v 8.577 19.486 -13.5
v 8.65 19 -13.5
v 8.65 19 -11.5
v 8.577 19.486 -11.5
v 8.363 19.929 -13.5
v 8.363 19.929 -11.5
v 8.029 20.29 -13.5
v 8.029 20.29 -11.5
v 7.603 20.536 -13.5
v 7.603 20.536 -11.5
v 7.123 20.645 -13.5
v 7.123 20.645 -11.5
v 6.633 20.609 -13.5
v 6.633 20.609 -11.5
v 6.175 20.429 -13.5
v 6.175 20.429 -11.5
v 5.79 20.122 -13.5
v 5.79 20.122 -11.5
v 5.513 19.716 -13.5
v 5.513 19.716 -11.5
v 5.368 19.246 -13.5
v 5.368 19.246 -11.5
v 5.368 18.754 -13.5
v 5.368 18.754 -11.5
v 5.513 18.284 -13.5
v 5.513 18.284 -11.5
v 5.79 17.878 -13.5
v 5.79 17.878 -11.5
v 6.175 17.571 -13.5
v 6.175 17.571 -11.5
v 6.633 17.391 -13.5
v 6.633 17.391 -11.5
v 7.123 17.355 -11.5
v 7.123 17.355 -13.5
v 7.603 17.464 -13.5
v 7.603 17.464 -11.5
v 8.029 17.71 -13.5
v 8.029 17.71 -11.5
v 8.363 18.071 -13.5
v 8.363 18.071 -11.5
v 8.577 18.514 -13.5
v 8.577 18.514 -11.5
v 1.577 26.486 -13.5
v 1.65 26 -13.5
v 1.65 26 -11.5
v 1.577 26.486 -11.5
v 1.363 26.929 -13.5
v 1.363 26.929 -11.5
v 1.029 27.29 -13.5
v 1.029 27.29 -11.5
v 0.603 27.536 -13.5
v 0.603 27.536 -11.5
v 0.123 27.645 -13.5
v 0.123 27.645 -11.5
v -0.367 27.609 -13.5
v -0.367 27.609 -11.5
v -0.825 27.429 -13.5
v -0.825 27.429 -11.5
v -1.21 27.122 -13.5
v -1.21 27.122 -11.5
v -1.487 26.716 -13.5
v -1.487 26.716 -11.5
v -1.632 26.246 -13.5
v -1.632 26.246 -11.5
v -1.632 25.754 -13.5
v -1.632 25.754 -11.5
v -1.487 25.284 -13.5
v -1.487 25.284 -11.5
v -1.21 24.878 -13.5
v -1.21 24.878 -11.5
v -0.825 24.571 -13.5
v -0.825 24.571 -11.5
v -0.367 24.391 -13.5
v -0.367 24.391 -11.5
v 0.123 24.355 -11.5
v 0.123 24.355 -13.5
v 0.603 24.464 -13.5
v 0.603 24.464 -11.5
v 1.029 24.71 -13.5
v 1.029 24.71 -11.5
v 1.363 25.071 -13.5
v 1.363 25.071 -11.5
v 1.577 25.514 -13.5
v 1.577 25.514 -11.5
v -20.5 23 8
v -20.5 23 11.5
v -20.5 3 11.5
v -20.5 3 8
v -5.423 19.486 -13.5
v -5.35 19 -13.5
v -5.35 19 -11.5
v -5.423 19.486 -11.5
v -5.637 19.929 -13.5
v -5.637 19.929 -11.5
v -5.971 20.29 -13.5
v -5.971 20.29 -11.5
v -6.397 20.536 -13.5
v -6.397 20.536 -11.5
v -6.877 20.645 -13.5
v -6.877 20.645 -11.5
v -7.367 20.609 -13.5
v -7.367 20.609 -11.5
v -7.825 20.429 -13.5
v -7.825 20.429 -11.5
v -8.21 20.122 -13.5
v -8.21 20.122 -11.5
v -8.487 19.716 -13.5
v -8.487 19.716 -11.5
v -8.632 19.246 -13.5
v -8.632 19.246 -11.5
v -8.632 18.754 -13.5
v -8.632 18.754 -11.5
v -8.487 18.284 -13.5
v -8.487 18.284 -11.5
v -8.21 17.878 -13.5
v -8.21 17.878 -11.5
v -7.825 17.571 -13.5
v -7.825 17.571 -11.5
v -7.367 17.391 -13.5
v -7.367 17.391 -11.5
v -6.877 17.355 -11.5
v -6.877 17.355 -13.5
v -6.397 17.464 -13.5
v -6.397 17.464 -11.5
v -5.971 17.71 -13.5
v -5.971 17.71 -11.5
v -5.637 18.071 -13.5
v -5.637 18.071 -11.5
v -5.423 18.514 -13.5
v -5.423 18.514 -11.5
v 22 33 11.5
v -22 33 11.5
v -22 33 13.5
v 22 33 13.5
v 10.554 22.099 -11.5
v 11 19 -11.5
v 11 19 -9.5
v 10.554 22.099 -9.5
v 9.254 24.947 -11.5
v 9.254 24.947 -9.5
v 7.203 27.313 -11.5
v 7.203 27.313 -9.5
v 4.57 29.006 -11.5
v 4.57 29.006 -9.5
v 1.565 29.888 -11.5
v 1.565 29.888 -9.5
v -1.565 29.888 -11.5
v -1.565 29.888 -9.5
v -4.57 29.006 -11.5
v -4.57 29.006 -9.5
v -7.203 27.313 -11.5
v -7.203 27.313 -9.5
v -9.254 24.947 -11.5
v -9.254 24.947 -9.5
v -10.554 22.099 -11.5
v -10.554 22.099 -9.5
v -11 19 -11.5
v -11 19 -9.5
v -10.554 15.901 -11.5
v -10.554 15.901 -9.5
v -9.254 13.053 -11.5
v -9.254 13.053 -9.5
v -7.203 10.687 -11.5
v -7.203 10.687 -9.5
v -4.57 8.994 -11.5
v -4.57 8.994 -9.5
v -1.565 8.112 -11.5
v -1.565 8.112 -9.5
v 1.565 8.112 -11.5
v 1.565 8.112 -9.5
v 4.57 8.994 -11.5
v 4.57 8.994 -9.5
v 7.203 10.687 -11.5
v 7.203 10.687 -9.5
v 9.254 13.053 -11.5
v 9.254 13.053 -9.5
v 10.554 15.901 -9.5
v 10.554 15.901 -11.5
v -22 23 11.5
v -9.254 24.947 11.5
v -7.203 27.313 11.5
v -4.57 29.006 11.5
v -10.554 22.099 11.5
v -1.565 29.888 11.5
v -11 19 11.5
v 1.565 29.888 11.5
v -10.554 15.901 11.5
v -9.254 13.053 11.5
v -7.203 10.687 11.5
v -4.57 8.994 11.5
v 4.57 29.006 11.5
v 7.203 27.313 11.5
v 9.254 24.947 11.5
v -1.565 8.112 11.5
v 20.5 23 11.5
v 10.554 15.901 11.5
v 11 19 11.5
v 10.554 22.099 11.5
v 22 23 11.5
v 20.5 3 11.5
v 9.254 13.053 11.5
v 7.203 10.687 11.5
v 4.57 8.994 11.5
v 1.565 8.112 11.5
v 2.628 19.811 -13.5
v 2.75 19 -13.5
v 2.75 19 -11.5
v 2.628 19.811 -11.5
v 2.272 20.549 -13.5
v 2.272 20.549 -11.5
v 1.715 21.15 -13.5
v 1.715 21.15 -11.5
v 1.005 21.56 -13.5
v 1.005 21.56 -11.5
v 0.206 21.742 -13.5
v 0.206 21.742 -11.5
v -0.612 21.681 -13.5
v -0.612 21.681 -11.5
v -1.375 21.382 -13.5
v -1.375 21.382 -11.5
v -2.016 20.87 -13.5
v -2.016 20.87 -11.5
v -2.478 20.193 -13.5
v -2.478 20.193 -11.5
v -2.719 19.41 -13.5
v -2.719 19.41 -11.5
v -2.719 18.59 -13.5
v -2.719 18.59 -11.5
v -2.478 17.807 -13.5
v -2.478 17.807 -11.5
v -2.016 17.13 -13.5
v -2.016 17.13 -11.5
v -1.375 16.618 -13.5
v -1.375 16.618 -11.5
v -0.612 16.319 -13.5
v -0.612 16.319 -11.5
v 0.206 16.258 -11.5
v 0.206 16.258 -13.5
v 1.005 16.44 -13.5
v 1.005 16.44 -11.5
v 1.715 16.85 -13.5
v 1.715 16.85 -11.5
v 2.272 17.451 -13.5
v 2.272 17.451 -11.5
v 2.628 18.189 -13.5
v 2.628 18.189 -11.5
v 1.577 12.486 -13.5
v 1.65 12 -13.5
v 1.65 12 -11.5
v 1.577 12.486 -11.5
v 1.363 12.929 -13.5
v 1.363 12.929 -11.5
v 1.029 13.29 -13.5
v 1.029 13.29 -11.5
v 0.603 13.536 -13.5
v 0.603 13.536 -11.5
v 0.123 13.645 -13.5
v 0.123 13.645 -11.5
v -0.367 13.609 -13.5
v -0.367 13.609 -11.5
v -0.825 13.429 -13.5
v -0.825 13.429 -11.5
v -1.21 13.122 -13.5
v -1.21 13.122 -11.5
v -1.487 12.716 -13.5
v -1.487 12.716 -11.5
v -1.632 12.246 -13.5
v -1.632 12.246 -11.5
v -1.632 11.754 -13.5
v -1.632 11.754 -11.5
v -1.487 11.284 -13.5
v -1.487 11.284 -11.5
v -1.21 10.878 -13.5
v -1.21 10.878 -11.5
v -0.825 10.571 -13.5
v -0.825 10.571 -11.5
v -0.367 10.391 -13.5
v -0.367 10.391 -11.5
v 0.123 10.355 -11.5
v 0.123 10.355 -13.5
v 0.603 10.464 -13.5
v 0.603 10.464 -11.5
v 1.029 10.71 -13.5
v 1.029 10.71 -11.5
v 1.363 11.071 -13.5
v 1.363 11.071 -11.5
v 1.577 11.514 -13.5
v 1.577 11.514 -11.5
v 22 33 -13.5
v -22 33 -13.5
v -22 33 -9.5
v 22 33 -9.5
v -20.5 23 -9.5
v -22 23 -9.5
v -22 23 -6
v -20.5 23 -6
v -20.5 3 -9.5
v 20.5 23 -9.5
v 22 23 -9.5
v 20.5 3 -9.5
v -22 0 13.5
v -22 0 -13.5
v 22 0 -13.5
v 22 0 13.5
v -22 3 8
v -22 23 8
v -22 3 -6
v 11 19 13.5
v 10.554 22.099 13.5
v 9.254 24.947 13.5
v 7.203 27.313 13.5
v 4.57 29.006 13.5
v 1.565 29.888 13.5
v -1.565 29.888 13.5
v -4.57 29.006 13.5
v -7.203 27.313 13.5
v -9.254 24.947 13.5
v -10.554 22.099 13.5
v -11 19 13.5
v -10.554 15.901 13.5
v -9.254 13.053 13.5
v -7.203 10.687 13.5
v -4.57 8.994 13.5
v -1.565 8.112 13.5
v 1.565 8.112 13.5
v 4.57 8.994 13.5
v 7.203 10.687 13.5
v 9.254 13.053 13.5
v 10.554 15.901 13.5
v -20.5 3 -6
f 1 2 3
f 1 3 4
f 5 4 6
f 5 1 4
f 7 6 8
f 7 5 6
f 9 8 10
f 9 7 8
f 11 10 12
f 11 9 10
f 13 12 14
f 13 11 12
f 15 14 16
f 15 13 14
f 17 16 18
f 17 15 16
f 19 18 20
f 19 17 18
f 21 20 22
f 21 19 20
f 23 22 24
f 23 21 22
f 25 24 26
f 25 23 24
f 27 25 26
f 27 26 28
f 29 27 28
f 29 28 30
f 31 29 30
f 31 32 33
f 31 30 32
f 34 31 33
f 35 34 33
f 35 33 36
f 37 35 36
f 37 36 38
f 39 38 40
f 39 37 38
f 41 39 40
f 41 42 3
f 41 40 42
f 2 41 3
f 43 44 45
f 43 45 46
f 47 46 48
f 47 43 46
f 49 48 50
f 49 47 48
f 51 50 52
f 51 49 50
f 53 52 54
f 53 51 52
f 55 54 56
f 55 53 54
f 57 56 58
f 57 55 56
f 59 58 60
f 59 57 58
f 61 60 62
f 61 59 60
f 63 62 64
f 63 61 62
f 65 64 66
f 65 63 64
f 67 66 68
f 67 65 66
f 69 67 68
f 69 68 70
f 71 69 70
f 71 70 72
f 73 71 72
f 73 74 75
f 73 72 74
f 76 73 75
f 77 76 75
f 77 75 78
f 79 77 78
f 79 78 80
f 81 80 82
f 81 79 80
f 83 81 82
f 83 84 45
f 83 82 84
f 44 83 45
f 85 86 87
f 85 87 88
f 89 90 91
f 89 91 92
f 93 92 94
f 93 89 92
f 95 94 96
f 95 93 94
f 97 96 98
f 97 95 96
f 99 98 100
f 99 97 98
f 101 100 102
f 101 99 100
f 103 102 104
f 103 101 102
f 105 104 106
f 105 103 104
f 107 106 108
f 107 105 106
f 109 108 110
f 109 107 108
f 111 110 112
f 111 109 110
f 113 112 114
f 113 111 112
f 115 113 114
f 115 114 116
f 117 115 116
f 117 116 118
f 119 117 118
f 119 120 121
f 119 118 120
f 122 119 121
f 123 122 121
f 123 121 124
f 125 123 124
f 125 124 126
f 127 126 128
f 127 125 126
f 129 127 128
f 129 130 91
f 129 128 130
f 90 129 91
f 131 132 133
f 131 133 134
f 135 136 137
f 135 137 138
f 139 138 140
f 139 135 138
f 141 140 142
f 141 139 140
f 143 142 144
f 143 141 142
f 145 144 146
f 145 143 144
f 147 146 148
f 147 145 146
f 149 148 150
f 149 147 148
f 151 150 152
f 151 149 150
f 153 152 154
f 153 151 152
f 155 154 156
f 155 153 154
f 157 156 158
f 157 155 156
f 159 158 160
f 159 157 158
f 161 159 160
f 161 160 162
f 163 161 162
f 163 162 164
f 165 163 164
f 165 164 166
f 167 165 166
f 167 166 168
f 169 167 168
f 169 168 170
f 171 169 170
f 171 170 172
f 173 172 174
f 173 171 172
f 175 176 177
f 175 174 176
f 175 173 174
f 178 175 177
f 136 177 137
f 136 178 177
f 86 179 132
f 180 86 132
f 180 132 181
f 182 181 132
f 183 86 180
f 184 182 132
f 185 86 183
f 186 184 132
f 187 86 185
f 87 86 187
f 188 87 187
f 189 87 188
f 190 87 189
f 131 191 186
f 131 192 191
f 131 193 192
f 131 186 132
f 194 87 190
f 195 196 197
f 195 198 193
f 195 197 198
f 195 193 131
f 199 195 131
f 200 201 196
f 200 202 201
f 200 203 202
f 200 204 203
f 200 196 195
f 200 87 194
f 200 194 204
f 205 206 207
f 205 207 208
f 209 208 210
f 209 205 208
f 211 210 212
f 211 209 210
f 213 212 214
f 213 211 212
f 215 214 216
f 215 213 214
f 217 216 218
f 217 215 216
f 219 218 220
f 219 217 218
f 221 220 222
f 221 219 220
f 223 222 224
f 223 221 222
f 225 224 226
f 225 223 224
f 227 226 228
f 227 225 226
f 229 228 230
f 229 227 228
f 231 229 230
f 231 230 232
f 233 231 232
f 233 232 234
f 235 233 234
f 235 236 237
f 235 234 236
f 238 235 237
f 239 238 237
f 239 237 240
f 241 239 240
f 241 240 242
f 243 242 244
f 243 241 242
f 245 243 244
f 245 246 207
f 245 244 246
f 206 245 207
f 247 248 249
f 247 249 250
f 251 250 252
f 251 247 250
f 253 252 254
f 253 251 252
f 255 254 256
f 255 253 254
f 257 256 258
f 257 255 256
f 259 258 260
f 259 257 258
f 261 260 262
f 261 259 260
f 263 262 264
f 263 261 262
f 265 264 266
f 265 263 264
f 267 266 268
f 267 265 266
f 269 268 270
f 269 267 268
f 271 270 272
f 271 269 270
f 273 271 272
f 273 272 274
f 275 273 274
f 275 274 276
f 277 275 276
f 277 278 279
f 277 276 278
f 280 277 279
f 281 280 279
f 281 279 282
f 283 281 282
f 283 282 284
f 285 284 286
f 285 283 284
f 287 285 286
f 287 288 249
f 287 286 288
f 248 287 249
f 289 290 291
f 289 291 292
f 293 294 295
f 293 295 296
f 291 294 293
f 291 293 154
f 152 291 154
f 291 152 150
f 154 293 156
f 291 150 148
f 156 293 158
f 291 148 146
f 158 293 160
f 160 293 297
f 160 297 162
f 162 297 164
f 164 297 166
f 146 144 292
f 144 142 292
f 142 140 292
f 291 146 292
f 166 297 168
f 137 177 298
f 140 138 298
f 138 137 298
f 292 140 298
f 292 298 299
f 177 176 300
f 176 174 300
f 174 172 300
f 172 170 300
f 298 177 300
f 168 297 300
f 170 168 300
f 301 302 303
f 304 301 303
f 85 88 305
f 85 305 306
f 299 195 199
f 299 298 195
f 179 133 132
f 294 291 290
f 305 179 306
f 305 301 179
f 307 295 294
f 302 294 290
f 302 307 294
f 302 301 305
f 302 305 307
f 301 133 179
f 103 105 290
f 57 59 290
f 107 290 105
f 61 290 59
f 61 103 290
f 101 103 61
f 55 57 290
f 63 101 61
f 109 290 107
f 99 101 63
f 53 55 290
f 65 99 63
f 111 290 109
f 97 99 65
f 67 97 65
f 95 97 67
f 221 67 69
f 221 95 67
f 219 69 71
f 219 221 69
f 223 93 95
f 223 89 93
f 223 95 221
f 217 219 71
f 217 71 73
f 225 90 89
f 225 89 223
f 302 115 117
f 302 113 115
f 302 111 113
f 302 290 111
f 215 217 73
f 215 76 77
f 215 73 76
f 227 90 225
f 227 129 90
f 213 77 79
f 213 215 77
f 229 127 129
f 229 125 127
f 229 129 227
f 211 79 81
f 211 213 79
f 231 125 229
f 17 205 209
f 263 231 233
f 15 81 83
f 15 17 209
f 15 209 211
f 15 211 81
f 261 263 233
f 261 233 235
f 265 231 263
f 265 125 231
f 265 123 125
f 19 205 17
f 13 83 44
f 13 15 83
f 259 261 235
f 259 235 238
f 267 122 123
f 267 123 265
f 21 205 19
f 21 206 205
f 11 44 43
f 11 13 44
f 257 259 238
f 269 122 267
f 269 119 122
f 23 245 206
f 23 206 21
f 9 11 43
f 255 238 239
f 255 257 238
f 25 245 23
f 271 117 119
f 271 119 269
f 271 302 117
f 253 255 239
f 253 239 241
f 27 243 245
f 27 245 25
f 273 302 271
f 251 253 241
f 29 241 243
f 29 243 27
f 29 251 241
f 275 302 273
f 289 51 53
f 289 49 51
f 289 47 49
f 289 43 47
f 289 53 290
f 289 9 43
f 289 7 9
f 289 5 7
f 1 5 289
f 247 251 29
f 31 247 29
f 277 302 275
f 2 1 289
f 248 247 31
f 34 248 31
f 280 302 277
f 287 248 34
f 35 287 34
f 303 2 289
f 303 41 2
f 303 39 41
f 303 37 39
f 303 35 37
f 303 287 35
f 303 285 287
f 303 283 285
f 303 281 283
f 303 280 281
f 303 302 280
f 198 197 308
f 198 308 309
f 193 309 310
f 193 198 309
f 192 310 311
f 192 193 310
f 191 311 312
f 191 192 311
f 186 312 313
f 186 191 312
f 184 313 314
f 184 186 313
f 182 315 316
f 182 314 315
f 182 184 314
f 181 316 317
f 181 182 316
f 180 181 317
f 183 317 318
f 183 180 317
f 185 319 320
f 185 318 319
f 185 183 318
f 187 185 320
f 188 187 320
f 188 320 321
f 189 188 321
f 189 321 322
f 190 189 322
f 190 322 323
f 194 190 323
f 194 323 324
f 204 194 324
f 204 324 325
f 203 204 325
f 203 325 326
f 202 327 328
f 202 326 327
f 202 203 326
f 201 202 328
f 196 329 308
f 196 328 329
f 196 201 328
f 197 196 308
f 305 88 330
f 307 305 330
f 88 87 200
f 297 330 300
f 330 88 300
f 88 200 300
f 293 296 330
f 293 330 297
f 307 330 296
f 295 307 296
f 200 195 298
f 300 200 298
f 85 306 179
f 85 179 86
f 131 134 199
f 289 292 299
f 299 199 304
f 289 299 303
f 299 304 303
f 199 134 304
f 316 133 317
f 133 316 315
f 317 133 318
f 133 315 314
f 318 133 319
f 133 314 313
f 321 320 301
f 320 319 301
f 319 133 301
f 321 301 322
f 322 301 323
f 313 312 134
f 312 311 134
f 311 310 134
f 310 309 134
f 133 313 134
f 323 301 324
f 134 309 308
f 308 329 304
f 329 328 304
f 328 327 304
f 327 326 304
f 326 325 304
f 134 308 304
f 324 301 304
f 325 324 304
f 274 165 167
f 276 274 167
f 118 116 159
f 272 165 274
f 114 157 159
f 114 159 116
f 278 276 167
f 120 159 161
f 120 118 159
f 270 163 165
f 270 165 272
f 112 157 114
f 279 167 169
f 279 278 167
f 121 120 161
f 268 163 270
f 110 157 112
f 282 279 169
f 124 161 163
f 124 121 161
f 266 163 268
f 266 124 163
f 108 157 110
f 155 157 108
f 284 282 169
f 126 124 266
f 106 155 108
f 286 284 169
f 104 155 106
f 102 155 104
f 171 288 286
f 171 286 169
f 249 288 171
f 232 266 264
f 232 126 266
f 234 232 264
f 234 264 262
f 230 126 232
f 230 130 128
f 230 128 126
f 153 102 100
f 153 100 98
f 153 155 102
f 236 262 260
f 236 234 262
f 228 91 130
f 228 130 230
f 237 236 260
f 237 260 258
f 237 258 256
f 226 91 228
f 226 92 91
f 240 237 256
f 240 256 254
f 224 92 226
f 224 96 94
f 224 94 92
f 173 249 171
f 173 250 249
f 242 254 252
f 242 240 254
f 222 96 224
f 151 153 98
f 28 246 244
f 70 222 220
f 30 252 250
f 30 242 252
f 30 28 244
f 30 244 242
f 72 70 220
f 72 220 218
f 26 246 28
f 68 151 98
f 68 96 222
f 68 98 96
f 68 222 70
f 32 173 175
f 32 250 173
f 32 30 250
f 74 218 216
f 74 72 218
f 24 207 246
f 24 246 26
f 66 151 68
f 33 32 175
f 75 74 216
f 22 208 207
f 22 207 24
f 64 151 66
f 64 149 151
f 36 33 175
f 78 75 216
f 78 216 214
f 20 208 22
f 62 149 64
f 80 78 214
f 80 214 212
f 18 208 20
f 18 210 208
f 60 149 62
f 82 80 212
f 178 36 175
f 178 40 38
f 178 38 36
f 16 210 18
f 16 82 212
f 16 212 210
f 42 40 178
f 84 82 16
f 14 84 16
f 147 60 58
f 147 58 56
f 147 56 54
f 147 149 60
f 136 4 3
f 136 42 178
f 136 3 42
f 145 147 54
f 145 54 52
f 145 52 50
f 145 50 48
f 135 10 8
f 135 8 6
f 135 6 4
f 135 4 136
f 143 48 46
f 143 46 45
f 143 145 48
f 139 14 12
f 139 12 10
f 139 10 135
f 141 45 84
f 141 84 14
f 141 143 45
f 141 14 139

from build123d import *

# Parameters (mm, degrees)
SKETCH1_W               = 44
SKETCH1_H               = 27
BOSS_EXTRUDE1_DEPTH     = 23
CUT_EXTRUDE2_START      = 23
SKETCH2_W               = 41
SKETCH2_H               = 21
CUT_EXTRUDE2_DEPTH      = 20
CUT_EXTRUDE3_START      = -20.5
SKETCH3_W               = 14
SKETCH3_H               = 20
CUT_EXTRUDE3_DEPTH      = 20
BOSS_EXTRUDE2_START     = 23
SKETCH4_W               = 44
SKETCH4_H               = 4
SKETCH4_H_2             = 2
BOSS_EXTRUDE2_DEPTH     = 10
CUT_EXTRUDE4_DEPTH      = 42.895703837
CUT_EXTRUDE4_DEPTH_BACK = 2
CUT_EXTRUDE4_START      = -9.5
SKETCH5_R               = 11
CUT_EXTRUDE5_DEPTH      = 42.895703837
CUT_EXTRUDE5_DEPTH_BACK = 42.895703837
SKETCH6_R               = 1.65
SKETCH6_R_2             = 2.75


with BuildPart() as part:
    # Sketch1 → Boss-Extrude1 (new body)
    with BuildSketch(Plane(origin=(0, 0, 0), x_dir=(1, 0, 0), z_dir=(0, 1, 0))):
        Rectangle(SKETCH1_W, SKETCH1_H)
    extrude(amount=BOSS_EXTRUDE1_DEPTH)

    # Sketch2 → Cut-Extrude2 (cut)
    with BuildSketch(Plane(origin=(0, 0, 0), x_dir=(1, 0, 0), z_dir=(0, 1, 0)).offset(CUT_EXTRUDE2_START)):
        with Locations((0, -1)):
            Rectangle(SKETCH2_W, SKETCH2_H)
    extrude(amount=-CUT_EXTRUDE2_DEPTH, mode=Mode.SUBTRACT)

    # Sketch3 → Cut-Extrude3 (cut)
    with BuildSketch(Plane(origin=(0, 0, 0), x_dir=(0, 0, -1), z_dir=(1, 0, 0)).offset(CUT_EXTRUDE3_START)):
        with Locations((-1, 13)):
            Rectangle(SKETCH3_W, SKETCH3_H)
    extrude(amount=-CUT_EXTRUDE3_DEPTH, mode=Mode.SUBTRACT)

    # Sketch4 → Boss-Extrude2 (add)
    with BuildSketch(Plane(origin=(0, 0, 0), x_dir=(1, 0, 0), z_dir=(0, 1, 0)).offset(BOSS_EXTRUDE2_START)):
        with Locations((0, 11.5)):
            Rectangle(SKETCH4_W, SKETCH4_H)
        with Locations((0, -12.5)):
            Rectangle(SKETCH4_W, SKETCH4_H_2)
    extrude(amount=BOSS_EXTRUDE2_DEPTH)

    # Sketch5 → Cut-Extrude4 (cut, two sides: drawn at the far end of the back side and taken through both)
    with BuildSketch(Plane.XY.offset(CUT_EXTRUDE4_START - CUT_EXTRUDE4_DEPTH_BACK)):
        with Locations((0, 19)):
            Circle(SKETCH5_R)
    extrude(amount=CUT_EXTRUDE4_DEPTH + CUT_EXTRUDE4_DEPTH_BACK, mode=Mode.SUBTRACT)

    # Sketch6 → Cut-Extrude5 (cut, two sides: drawn at the far end of the back side and taken through both)
    with BuildSketch(Plane.XY.offset(-CUT_EXTRUDE5_DEPTH_BACK)):
        with Locations((-7, 19)):
            Circle(SKETCH6_R)
        with Locations((0, 19)):
            Circle(SKETCH6_R_2)
        with Locations((0, 26)):
            Circle(SKETCH6_R)
        with Locations((7, 19)):
            Circle(SKETCH6_R)
        with Locations((0, 12)):
            Circle(SKETCH6_R)
    extrude(amount=CUT_EXTRUDE5_DEPTH + CUT_EXTRUDE5_DEPTH_BACK, mode=Mode.SUBTRACT)


solid = part.part
